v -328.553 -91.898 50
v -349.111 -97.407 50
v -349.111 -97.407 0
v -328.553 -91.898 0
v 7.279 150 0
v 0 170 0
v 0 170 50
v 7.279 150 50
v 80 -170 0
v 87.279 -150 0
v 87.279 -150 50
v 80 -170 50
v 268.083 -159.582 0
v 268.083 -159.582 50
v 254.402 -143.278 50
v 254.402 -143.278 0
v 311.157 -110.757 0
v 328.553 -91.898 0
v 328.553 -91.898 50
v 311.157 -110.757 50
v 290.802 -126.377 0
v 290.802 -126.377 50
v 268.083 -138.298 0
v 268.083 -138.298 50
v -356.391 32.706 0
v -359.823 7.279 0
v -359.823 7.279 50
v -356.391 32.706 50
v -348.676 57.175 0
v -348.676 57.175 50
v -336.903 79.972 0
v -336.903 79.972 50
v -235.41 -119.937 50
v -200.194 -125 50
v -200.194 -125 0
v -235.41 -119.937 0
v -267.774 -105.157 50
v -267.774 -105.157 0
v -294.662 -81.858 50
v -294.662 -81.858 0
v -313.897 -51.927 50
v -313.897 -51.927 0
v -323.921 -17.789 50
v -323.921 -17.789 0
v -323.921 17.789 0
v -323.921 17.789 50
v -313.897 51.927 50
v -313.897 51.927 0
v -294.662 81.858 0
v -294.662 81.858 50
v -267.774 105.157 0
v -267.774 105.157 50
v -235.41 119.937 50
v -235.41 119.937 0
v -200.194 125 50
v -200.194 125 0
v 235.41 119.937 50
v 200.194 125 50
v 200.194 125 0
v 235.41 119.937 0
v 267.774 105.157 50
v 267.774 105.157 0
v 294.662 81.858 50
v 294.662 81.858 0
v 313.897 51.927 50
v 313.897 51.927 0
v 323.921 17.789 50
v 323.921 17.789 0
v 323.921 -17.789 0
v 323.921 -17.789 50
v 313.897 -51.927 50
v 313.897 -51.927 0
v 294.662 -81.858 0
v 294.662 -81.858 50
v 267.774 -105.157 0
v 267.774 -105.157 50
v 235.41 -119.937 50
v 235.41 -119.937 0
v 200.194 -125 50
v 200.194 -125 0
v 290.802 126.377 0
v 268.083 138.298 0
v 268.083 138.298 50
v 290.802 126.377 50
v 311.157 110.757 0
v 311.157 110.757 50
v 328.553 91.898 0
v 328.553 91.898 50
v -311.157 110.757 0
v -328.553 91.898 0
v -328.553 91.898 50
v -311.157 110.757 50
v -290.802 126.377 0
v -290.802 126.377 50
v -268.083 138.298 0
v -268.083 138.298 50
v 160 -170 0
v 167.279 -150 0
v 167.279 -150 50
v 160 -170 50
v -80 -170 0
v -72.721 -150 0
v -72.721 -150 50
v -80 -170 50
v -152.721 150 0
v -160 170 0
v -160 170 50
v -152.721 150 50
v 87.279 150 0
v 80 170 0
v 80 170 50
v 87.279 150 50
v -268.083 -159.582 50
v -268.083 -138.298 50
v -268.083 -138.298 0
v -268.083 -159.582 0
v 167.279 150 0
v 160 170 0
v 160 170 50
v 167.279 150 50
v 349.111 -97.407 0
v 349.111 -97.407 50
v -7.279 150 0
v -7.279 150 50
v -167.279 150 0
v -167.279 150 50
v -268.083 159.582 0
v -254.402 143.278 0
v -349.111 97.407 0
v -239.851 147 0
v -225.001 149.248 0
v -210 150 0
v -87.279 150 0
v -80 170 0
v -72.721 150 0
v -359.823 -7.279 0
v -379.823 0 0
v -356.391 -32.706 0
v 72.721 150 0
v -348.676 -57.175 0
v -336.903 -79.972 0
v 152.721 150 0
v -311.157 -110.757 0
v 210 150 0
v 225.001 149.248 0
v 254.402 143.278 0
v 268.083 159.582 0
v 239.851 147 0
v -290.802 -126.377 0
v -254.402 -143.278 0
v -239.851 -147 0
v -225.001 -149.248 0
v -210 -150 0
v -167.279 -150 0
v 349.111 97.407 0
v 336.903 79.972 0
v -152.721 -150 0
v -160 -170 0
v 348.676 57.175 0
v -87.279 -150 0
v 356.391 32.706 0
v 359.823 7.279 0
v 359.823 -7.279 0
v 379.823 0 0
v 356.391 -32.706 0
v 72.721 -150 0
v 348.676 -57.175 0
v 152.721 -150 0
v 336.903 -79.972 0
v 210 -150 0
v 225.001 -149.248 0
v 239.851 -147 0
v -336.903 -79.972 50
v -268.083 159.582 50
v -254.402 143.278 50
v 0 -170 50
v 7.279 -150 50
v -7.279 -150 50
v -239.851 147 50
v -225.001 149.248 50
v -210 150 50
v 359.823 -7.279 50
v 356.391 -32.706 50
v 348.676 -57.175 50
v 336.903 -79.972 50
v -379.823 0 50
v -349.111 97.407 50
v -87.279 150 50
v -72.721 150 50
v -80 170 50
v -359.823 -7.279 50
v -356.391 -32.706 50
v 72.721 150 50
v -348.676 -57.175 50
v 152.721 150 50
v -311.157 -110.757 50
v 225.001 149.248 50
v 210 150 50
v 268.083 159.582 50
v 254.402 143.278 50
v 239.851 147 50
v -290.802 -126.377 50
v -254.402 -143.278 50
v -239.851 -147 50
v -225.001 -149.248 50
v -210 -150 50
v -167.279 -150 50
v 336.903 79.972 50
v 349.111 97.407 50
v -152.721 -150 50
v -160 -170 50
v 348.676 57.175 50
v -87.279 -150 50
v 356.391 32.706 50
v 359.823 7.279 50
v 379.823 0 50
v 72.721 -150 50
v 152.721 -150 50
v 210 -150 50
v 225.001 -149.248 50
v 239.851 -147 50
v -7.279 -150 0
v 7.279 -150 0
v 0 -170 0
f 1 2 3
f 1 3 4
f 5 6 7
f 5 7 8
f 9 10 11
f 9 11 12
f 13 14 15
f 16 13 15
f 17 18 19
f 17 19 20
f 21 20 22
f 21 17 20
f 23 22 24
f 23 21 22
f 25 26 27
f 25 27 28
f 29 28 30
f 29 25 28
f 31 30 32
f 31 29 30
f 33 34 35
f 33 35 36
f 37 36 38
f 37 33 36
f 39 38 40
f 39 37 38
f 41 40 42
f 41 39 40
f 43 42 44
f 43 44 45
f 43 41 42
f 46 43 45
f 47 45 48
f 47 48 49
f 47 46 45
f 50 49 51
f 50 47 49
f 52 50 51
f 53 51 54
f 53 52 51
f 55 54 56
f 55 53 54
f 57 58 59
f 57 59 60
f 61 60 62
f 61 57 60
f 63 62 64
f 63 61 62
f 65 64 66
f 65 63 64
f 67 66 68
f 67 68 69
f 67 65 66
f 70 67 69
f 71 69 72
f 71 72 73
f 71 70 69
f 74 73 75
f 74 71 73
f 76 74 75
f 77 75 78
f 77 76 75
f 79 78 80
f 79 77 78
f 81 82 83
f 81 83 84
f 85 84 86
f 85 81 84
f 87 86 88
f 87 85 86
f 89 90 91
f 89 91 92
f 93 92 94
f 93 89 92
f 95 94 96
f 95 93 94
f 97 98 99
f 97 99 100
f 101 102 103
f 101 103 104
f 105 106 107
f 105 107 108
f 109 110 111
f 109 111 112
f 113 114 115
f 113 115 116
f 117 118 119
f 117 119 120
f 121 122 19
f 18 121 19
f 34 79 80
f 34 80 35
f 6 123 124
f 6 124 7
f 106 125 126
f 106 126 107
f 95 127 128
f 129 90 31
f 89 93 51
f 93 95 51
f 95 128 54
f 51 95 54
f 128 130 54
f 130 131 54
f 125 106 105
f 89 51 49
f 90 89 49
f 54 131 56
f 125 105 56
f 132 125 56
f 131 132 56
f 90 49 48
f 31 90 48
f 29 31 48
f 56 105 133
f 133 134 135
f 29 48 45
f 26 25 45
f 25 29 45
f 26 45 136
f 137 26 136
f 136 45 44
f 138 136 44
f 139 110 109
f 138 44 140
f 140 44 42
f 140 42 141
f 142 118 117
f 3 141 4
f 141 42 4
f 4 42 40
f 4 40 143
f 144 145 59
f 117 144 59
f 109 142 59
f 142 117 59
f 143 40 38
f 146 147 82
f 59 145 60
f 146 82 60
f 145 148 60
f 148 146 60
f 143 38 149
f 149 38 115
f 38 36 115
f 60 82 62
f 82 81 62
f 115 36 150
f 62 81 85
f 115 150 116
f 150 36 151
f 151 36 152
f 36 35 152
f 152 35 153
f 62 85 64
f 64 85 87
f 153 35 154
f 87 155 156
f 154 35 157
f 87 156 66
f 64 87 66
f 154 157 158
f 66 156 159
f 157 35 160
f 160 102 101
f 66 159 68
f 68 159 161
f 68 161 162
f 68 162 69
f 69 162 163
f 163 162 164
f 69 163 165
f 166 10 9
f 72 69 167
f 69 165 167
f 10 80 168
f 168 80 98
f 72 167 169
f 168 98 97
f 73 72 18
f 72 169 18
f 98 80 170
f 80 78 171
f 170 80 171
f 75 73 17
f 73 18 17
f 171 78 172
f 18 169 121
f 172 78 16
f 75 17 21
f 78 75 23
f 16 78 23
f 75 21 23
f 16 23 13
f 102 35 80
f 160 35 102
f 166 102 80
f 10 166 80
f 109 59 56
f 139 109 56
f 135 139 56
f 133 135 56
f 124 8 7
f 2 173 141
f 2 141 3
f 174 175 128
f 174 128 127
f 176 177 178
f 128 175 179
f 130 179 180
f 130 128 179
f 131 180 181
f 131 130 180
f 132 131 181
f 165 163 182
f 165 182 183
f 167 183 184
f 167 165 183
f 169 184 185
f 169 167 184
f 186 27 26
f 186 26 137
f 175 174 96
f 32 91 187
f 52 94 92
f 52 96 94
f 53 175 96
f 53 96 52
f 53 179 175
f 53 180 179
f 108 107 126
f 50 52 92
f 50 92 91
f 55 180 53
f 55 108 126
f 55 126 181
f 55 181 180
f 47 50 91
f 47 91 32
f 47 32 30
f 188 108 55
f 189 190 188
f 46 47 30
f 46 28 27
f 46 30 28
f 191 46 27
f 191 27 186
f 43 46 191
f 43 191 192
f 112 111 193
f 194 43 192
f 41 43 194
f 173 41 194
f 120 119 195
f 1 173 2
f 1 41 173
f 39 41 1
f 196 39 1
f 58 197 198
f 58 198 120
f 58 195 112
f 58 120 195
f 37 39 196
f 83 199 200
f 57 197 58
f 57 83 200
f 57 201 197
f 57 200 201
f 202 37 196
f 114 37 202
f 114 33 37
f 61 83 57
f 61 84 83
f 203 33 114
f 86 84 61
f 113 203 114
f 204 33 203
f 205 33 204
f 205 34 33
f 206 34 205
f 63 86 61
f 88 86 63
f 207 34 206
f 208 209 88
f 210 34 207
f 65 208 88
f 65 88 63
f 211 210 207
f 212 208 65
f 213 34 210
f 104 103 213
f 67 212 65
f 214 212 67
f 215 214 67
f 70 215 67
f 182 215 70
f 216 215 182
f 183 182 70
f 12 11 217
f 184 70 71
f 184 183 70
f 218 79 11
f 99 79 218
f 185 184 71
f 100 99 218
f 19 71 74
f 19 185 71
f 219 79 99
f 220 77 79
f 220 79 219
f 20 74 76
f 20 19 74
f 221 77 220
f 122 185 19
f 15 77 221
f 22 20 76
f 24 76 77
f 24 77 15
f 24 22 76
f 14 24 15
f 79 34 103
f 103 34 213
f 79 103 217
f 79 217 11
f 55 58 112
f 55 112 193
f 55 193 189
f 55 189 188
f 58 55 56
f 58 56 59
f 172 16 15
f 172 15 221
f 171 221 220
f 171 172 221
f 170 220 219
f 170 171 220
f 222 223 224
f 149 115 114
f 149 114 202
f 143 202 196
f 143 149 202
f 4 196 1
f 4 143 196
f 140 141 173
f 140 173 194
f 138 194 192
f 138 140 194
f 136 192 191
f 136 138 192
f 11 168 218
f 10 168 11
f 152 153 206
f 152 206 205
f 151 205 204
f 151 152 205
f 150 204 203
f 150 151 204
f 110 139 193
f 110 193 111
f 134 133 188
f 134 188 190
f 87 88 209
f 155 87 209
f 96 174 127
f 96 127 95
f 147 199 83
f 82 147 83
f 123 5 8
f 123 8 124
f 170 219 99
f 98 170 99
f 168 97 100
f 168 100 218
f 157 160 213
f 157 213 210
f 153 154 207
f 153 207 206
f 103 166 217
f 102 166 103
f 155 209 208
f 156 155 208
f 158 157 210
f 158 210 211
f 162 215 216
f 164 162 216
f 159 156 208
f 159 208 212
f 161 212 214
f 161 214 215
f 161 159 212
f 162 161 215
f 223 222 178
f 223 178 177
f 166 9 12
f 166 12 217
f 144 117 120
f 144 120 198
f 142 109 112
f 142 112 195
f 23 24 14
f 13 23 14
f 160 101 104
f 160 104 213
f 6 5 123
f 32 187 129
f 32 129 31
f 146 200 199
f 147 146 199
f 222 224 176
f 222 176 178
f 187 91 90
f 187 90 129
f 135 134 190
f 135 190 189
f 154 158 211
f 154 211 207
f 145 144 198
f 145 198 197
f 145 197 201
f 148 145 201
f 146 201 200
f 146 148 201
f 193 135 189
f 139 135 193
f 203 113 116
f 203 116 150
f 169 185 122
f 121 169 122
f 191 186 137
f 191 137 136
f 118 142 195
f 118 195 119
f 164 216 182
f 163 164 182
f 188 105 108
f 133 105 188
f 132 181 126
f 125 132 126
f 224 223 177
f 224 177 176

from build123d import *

# Parameters (mm, degrees)
BOSS_EXTRUDE1_DEPTH   = 50
CUT_EXTRUDE1_DEPTH    = 50
BOSS_EXTRUDE2_DEPTH   = 50
BOSS_EXTRUDE2_2_DEPTH = 50
LPATTERN1_COUNT       = 4
LPATTERN1_PITCH       = 80
LPATTERN2_COUNT       = 4
LPATTERN2_PITCH       = 80
BOSS_EXTRUDE3_DEPTH   = 50
CIRPATTERN1_COUNT     = 3
CIRPATTERN1_ANGLE     = 70
CIRPATTERN2_COUNT     = 3
CIRPATTERN2_ANGLE     = 70
MIRROR1_COPY_1_DEPTH  = 50
MIRROR1_COPY_2_DEPTH  = 50
MIRROR1_COPY_3_DEPTH  = 50
MIRROR1_COPY_4_DEPTH  = 50


with BuildPart() as part:
    # Sketch1 → Boss-Extrude1 (new body)
    with BuildSketch(Plane.XY):
        with BuildLine():
            Line((-210, 150), (210, 150))
            ThreePointArc((210, 150), (360, 0), (210, -150))
            Line((210, -150), (-210, -150))
            ThreePointArc((-210, -150), (-360, 0), (-210, 150))
        make_face()
    extrude(amount=BOSS_EXTRUDE1_DEPTH)

    # Sketch2 → Cut-Extrude1 (cut)
    with BuildSketch(Plane.XY.offset(50)):
        with BuildLine():
            Line((200.1935, -125), (-200.1935, -125))
            ThreePointArc((-200.1935, -125), (-325.1935, 0), (-200.1935, 125))
            Line((-200.1935, 125), (200.1935, 125))
            ThreePointArc((200.1935, 125), (325.1935, 0), (200.1935, -125))
        make_face()
    extrude(amount=-CUT_EXTRUDE1_DEPTH, mode=Mode.SUBTRACT)


with BuildPart() as body_2:
    # Sketch3 → Boss-Extrude2 (new body)
    with BuildSketch(Plane.XY):
        Polygon((-7.279404685, 150), (0, 170), (7.279404685, 150), align=None)
    boss_extrude2 = extrude(amount=BOSS_EXTRUDE2_DEPTH)


with BuildPart() as body_3:
    # Sketch3 → Boss-Extrude2 2 (new body)
    with BuildSketch(Plane.XY):
        Polygon((7.279404685, -150), (0, -170), (-7.279404685, -150), align=None)
    boss_extrude2_2 = extrude(amount=BOSS_EXTRUDE2_2_DEPTH)


with BuildPart() as part_1:
    add(part.part)

    # LPattern1: Boss-Extrude2, Boss-Extrude2 2 ×4, 1 skipped
    with Locations(*[(i * LPATTERN1_PITCH, 0, 0) for i in range(1, LPATTERN1_COUNT) if i not in (3,)]):
        add(boss_extrude2)
        add(boss_extrude2_2)

    # LPattern2: Boss-Extrude2, Boss-Extrude2 2 ×4, 1 skipped
    with Locations(*[(-i * LPATTERN2_PITCH, 0, 0) for i in range(1, LPATTERN2_COUNT) if i not in (3,)]):
        add(boss_extrude2)
        add(boss_extrude2_2)

    # Sketch4 → Boss-Extrude3 (add)
    with BuildSketch(Plane.XY.offset(50)):
        Polygon((359.823263439, 7.279404685), (379.823263439, 0), (359.823263439, -7.279404685), align=None)
    boss_extrude3 = extrude(amount=-BOSS_EXTRUDE3_DEPTH)

    # CirPattern1: Boss-Extrude3 ×3 about axis
    cirpattern1_axis = Axis((210, 0, 0), (0, 0, 1))
    for i in range(1, CIRPATTERN1_COUNT):
        add(boss_extrude3.rotate(cirpattern1_axis, i * CIRPATTERN1_ANGLE / (CIRPATTERN1_COUNT - 1)))

    # CirPattern2: Boss-Extrude3 ×3 about axis
    cirpattern2_axis = Axis((210, 0, 0), (0, 0, -1))
    for i in range(1, CIRPATTERN2_COUNT):
        add(boss_extrude3.rotate(cirpattern2_axis, i * CIRPATTERN2_ANGLE / (CIRPATTERN2_COUNT - 1)))

    # Mirror1: Boss-Extrude3 across plane
    add(boss_extrude3.mirror(Plane(origin=(0, 0, 0), x_dir=(0, 0, 1), z_dir=(1, 0, 0))))

    # Mirror1 copy 1 sketch → Mirror1 copy 1 (add)
    with BuildSketch(Plane(origin=(-37.978070699, -120.451051634, 50), x_dir=(-0.819152044288991, 0.5735764363510473, 0), z_dir=(0, 0, 1))):
        Polygon((359.823263439, -7.279404685), (379.823263439, 0), (359.823263439, 7.279404685), align=None)
    extrude(amount=-MIRROR1_COPY_1_DEPTH)

    # Mirror1 copy 2 sketch → Mirror1 copy 2 (add)
    with BuildSketch(Plane(origin=(-138.175769902, -197.335450365, 50), x_dir=(-0.3420201433256661, 0.9396926207859093, 0), z_dir=(0, 0, 1))):
        Polygon((359.823263439, -7.279404685), (379.823263439, 0), (359.823263439, 7.279404685), align=None)
    extrude(amount=-MIRROR1_COPY_2_DEPTH)

    # Mirror1 copy 3 sketch → Mirror1 copy 3 (add)
    with BuildSketch(Plane(origin=(-37.978070699, 120.451051634, 50), x_dir=(-0.819152044288991, -0.5735764363510473, 0), z_dir=(0, 0, 1))):
        Polygon((359.823263439, -7.279404685), (379.823263439, 0), (359.823263439, 7.279404685), align=None)
    extrude(amount=-MIRROR1_COPY_3_DEPTH)

    # Mirror1 copy 4 sketch → Mirror1 copy 4 (add)
    with BuildSketch(Plane(origin=(-138.175769902, 197.335450365, 50), x_dir=(-0.3420201433256661, -0.9396926207859093, 0), z_dir=(0, 0, 1))):
        Polygon((359.823263439, -7.279404685), (379.823263439, 0), (359.823263439, 7.279404685), align=None)
    extrude(amount=-MIRROR1_COPY_4_DEPTH)


solid = Compound([body_2.part, body_3.part, part_1.part])
